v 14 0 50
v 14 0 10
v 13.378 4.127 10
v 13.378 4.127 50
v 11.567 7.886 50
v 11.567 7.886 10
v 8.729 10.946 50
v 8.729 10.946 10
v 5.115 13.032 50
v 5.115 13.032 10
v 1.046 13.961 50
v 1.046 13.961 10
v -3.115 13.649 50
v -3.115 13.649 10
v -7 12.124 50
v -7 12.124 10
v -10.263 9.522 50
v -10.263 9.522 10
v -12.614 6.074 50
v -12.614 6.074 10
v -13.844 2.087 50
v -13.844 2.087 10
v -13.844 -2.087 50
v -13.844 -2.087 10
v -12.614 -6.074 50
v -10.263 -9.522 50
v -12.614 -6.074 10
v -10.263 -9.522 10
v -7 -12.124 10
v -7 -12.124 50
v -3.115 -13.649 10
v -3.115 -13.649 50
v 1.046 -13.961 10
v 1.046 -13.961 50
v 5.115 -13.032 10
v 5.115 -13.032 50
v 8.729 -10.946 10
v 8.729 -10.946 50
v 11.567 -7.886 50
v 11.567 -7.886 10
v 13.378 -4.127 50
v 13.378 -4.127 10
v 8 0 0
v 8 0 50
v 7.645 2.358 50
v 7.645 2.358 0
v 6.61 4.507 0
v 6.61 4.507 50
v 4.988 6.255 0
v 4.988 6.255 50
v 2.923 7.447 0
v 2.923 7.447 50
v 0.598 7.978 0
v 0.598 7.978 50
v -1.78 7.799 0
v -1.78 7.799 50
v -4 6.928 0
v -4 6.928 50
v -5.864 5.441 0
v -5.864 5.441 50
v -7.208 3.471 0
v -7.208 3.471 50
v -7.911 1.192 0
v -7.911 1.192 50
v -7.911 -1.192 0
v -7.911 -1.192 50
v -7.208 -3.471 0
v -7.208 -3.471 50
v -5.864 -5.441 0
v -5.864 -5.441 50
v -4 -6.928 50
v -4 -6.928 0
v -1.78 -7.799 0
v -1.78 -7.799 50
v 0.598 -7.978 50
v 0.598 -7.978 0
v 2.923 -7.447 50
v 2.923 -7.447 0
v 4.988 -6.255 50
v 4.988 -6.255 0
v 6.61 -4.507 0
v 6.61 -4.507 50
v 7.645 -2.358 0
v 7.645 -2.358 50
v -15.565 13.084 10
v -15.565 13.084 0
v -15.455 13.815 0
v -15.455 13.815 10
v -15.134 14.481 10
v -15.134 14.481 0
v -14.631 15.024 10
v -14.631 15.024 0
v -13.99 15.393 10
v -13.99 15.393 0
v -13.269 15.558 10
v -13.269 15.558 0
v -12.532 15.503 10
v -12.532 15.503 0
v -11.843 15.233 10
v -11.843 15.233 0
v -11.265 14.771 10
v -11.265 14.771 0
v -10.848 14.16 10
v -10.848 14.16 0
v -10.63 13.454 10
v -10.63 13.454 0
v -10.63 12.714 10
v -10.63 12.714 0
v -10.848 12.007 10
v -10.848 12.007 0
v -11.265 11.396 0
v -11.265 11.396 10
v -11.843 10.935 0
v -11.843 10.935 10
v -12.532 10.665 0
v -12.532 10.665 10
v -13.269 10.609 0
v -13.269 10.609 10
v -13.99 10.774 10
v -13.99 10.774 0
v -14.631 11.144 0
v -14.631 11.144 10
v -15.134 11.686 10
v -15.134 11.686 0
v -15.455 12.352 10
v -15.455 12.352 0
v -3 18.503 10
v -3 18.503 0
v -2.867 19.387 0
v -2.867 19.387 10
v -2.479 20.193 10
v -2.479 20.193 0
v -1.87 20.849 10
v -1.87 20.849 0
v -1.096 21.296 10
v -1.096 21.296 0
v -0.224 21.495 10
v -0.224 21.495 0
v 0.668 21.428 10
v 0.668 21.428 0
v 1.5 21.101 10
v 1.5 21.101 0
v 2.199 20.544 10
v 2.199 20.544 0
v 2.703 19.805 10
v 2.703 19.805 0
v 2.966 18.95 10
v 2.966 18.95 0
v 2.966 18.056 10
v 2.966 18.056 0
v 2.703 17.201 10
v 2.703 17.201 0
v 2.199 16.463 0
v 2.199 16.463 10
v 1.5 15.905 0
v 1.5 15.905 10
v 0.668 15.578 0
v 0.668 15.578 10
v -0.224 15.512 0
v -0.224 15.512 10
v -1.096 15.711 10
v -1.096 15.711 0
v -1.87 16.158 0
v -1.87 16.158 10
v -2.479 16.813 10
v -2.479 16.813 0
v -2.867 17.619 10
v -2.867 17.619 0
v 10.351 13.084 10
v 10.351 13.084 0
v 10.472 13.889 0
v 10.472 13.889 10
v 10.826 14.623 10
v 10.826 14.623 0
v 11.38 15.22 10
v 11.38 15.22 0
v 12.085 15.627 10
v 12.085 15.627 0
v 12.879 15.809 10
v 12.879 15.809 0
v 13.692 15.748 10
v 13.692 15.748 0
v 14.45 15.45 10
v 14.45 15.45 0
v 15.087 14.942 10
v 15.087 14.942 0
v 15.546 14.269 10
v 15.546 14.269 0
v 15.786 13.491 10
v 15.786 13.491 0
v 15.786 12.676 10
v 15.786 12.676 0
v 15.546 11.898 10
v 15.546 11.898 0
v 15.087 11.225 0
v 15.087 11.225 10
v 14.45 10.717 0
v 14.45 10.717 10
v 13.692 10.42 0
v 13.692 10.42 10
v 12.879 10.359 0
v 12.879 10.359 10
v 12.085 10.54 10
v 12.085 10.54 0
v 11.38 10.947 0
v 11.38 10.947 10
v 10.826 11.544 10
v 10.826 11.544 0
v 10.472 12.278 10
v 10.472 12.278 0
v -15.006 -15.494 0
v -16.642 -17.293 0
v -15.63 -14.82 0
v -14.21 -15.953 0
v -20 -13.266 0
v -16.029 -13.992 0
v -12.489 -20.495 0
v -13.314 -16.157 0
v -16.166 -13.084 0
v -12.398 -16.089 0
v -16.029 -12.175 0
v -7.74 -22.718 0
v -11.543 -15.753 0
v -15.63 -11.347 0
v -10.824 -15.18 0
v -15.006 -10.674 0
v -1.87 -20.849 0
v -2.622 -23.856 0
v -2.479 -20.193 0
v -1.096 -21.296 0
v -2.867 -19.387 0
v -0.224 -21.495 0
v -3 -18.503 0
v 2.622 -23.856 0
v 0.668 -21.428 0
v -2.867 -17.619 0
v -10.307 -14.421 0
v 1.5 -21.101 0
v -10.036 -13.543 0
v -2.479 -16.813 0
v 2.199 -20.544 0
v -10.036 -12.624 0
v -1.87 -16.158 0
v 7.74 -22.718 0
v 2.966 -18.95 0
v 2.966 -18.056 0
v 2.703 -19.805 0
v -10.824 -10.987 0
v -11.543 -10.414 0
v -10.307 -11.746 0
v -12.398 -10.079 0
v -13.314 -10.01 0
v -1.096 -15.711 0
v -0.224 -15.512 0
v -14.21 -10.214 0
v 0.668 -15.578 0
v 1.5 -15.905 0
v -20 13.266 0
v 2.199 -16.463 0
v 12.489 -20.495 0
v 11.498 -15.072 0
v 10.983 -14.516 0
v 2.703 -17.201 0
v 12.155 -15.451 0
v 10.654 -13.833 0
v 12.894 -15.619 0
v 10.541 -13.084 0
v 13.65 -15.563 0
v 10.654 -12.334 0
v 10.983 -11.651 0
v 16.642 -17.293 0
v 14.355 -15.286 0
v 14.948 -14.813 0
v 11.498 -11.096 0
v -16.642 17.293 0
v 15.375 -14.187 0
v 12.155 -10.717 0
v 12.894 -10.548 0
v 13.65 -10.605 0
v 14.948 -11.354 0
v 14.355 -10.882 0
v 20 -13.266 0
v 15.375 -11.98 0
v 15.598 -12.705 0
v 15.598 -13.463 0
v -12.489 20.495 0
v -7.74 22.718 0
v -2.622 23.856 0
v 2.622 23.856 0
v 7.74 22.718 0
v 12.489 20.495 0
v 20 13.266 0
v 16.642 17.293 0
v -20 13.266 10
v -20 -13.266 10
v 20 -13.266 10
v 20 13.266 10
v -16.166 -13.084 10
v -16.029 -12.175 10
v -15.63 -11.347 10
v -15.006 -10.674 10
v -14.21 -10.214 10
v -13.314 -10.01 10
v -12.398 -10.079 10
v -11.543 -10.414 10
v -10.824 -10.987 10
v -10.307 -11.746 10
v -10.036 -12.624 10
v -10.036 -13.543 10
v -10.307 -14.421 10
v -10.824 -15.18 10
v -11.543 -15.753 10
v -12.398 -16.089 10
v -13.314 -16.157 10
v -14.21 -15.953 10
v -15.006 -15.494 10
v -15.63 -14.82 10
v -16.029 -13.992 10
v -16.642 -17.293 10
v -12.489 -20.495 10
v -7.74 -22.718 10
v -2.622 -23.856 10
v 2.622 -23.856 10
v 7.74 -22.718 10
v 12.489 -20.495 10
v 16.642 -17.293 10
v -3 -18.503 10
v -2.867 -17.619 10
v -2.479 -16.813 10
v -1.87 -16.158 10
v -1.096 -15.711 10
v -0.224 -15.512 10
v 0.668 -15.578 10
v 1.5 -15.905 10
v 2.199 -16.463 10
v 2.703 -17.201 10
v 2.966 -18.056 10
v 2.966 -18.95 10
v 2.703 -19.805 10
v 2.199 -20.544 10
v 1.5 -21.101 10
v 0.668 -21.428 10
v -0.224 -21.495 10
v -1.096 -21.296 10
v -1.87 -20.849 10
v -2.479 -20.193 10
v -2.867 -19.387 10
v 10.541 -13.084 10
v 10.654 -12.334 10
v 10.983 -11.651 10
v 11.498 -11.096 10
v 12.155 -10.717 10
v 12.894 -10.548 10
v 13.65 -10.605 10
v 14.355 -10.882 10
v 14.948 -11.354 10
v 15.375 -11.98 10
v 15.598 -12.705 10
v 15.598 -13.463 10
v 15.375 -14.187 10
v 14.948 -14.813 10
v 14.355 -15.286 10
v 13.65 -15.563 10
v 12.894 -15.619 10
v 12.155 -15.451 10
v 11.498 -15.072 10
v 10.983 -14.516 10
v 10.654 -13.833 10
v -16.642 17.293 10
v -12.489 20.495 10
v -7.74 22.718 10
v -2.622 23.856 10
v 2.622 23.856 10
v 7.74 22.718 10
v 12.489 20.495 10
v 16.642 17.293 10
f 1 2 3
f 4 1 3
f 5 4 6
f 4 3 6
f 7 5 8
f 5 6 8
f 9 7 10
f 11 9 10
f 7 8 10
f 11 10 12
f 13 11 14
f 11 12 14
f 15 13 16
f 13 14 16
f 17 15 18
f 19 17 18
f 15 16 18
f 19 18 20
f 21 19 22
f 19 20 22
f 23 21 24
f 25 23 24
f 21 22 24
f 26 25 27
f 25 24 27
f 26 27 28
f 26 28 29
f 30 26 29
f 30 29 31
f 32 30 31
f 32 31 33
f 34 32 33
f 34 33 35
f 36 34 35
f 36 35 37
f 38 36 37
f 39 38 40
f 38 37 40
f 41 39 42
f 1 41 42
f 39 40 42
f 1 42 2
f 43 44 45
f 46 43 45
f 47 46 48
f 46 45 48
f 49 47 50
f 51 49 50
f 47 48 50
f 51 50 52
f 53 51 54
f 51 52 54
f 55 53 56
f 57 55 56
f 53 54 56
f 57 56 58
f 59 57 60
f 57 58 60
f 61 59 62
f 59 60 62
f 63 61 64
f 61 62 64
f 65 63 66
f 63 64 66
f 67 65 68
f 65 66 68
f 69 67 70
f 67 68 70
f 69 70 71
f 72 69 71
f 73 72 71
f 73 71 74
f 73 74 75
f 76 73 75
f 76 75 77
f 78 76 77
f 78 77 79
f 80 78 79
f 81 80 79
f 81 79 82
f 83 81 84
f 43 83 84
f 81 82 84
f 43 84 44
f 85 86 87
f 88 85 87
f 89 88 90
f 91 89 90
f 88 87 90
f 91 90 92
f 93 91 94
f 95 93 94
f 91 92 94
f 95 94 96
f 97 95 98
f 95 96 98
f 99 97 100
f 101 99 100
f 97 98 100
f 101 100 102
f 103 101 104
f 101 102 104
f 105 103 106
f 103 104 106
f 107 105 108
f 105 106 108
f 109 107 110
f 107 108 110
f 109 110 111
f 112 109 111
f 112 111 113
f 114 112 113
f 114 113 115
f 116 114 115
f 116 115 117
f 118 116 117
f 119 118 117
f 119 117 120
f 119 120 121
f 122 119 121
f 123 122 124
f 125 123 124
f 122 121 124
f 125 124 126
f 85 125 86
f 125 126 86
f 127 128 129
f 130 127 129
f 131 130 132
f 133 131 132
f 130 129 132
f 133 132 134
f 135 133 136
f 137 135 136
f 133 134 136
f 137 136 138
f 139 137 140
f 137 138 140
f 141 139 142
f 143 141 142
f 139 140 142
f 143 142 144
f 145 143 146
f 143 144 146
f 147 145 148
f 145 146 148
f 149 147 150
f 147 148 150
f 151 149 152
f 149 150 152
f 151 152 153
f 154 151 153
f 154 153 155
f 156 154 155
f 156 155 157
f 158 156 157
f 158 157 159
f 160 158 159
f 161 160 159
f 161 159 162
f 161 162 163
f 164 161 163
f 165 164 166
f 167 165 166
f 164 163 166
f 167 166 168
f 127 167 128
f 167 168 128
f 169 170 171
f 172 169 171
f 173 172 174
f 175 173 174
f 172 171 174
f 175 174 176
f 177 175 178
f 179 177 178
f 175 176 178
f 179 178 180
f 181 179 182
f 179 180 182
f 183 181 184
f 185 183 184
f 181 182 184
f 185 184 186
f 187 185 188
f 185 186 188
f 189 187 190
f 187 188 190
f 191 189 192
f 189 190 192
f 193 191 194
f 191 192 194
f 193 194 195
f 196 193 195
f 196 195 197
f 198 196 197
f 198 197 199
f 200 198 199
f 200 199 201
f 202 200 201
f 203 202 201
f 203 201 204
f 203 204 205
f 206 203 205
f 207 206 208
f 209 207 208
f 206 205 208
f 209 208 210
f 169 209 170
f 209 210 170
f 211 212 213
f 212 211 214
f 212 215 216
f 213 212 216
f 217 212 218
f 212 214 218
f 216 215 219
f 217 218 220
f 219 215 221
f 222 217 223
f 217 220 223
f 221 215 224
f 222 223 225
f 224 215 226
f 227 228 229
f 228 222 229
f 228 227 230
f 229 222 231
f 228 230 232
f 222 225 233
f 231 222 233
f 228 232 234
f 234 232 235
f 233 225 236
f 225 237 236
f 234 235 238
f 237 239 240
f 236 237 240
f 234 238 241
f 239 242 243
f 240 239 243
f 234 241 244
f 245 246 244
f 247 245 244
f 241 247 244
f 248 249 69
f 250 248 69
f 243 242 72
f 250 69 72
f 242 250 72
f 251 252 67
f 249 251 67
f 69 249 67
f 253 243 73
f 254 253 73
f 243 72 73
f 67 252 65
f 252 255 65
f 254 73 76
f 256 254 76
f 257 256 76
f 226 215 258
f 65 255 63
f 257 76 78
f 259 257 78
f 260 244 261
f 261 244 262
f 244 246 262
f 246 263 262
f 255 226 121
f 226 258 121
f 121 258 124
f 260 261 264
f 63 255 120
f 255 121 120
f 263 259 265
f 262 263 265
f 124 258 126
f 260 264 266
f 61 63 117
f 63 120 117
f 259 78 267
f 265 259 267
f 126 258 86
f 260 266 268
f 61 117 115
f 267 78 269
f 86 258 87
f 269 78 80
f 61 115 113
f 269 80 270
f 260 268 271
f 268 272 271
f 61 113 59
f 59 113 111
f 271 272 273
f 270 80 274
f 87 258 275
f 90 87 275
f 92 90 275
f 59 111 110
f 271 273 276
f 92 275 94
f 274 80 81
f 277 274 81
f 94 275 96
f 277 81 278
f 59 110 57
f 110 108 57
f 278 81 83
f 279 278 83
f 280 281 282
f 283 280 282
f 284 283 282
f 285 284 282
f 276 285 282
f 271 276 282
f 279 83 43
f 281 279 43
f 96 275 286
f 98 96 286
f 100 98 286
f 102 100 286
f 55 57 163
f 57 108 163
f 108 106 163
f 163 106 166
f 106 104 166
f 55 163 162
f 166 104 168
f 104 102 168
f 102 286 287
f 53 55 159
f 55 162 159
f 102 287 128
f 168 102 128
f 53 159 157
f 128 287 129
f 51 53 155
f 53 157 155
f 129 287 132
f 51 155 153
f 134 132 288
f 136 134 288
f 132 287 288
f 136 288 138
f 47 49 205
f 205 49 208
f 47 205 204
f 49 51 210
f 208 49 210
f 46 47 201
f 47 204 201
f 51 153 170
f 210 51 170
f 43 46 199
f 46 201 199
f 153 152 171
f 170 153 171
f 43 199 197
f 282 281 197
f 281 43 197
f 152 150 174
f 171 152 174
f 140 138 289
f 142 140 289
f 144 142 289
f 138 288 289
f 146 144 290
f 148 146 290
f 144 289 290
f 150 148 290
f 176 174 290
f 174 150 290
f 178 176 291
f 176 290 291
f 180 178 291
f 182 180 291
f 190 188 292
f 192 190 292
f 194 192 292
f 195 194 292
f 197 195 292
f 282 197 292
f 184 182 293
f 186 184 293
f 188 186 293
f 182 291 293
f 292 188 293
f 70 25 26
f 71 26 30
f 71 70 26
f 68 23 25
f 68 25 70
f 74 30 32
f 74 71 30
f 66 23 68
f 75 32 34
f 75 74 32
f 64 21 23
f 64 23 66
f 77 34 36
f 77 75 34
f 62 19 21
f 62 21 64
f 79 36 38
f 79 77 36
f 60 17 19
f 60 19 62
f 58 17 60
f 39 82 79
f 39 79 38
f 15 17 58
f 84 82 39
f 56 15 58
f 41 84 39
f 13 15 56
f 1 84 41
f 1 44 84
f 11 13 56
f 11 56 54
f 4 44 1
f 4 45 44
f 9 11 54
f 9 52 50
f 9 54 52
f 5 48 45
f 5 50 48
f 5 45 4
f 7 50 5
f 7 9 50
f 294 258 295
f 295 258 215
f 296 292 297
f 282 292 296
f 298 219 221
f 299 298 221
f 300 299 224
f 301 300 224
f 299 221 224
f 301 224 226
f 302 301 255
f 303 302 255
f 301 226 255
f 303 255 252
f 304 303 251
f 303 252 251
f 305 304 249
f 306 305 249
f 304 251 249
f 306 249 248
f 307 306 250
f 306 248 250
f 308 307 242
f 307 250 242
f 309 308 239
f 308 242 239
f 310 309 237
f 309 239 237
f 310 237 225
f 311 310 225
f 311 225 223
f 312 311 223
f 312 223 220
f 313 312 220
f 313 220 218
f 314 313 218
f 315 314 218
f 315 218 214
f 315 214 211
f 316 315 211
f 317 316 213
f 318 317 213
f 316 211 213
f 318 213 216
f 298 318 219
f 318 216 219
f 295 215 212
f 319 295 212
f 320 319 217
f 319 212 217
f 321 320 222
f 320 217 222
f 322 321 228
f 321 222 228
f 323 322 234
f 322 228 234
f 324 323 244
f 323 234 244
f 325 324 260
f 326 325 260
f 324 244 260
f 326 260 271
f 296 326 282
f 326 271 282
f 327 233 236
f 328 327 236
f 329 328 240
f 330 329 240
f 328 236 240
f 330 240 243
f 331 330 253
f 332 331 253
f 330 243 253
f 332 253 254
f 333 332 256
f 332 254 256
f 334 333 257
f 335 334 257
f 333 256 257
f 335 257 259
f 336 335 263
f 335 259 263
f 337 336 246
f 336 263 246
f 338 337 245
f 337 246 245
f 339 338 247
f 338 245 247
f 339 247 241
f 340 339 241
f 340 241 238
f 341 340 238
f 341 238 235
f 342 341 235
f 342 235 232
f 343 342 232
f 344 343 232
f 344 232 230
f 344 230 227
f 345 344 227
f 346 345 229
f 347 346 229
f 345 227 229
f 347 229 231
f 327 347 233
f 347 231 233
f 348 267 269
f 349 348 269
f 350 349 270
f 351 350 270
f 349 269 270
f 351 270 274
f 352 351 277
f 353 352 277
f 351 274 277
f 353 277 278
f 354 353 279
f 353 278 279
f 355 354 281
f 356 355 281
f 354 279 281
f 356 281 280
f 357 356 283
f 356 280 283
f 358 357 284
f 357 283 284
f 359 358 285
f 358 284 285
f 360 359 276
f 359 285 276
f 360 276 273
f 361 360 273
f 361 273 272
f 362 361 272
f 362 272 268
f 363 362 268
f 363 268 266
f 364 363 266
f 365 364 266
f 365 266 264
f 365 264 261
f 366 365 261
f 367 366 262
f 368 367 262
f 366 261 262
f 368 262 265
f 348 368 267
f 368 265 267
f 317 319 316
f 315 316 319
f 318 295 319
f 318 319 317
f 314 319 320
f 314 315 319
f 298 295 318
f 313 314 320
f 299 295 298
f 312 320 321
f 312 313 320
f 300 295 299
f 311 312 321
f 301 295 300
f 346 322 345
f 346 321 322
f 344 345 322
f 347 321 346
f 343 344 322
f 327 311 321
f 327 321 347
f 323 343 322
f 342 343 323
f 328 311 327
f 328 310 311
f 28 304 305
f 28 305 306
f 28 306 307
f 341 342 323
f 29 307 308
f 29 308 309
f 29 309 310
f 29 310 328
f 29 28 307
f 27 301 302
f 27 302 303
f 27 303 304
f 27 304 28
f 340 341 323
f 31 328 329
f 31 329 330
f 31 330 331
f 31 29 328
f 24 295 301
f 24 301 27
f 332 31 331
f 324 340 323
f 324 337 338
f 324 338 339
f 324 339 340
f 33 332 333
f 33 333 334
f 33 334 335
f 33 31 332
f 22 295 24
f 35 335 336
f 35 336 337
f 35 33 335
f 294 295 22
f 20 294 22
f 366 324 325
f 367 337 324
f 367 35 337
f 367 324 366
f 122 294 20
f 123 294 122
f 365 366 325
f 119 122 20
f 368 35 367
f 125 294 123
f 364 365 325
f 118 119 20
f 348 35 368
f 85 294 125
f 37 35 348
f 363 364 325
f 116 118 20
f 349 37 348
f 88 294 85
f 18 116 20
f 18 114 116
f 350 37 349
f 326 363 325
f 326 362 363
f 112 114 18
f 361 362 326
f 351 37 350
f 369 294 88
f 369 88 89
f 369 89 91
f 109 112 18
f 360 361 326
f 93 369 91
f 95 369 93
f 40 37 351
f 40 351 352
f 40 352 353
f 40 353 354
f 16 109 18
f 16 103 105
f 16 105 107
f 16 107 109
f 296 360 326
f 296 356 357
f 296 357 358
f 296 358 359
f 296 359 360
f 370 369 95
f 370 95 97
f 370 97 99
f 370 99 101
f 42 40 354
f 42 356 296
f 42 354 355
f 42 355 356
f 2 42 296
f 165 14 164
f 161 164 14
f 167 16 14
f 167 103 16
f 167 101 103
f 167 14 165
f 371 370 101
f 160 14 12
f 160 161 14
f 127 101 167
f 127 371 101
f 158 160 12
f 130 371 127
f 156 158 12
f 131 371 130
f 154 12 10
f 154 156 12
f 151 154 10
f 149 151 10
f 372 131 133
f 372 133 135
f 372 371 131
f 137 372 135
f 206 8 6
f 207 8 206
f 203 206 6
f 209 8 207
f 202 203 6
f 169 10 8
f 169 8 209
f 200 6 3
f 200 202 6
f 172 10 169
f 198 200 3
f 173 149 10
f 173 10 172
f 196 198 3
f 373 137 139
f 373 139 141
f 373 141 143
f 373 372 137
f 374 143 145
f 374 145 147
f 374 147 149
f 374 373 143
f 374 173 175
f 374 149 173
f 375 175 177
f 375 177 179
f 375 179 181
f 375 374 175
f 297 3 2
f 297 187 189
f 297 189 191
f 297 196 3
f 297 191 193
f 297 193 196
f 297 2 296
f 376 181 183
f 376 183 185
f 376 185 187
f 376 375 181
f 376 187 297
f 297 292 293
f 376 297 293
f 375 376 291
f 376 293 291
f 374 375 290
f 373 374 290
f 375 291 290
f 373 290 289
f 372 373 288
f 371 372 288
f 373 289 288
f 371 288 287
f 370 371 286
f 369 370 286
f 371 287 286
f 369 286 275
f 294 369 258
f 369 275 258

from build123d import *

# Parameters (mm, degrees)
SKETCH_1_R          = 24
EXTRUDE_1_DEPTH     = 10
SKETCH_2_R          = 14
EXTRUDE_2_DEPTH     = 40
SKETCH_3_R          = 8
CUT_EXTRUDE_1_DEPTH = 50
CUT_EXTRUDE_2_DEPTH = 10
SKETCH_5_R          = 3
SKETCH_5_R_2        = 2.542834368
SKETCH_5_R_3        = 3.082379743
SKETCH_5_R_4        = 2.48129437
SKETCH_5_R_5        = 2.732701735
CUT_EXTRUDE_3_DEPTH = 10


with BuildPart() as part:
    # 草图1 → 凸台-拉伸1 (new body)
    with BuildSketch(Plane.XY):
        Circle(SKETCH_1_R)
    extrude(amount=EXTRUDE_1_DEPTH)

    # 草图2 → 凸台-拉伸2 (add)
    with BuildSketch(Plane.XY.offset(10)):
        Circle(SKETCH_2_R)
    extrude(amount=EXTRUDE_2_DEPTH)

    # 草图3 → 切除-拉伸1 (cut)
    with BuildSketch(Plane.XY.offset(50)):
        Circle(SKETCH_3_R)
    extrude(amount=-CUT_EXTRUDE_1_DEPTH, mode=Mode.SUBTRACT)

    # 草图4 → 切除-拉伸2 (cut)
    with BuildSketch(Plane(origin=(0, 0, 0), x_dir=(-1, 0, 0), z_dir=(0, 0, -1))):
        with BuildLine():
            Line((-20, 13.266499161), (-20, -13.266499161))
            ThreePointArc((-20, -13.266499161), (-24, 0), (-20, 13.266499161))
        make_face()
        with BuildLine():
            Line((20, 13.266499161), (20, -13.266499161))
            ThreePointArc((20, -13.266499161), (24, 0), (20, 13.266499161))
        make_face()
    extrude(amount=-CUT_EXTRUDE_2_DEPTH, mode=Mode.SUBTRACT)

    # 草图5 → 切除-拉伸3 (cut)
    with BuildSketch(Plane(origin=(0, 0, 0), x_dir=(-1, 0, 0), z_dir=(0, 0, -1))):
        with Locations((0, 18.503142877)):
            Circle(SKETCH_5_R)
        with Locations((-13.083697802, -13.083697802)):
            Circle(SKETCH_5_R_2)
        with Locations((13.083697802, -13.083697802)):
            Circle(SKETCH_5_R_3)
        with Locations((13.083697802, 13.083697802)):
            Circle(SKETCH_5_R_4)
        with Locations((-13.083697802, 13.083697802)):
            Circle(SKETCH_5_R_5)
        with Locations((0, -18.503142877)):
            Circle(SKETCH_5_R)
    extrude(amount=-CUT_EXTRUDE_3_DEPTH, mode=Mode.SUBTRACT)


solid = part.part
